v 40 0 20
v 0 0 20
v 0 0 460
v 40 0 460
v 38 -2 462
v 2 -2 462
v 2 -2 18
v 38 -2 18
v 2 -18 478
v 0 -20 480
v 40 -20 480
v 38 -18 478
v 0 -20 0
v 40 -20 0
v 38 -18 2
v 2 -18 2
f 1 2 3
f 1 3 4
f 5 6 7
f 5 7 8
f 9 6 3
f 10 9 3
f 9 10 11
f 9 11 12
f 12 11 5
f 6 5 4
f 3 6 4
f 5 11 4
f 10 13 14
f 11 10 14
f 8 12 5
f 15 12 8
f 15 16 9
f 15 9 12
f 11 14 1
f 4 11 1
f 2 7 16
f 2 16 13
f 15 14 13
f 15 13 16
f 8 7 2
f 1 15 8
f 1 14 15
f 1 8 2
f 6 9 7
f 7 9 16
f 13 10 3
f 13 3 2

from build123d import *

# Parameters (mm, degrees)
SKETCH1_W           = 40
SKETCH1_H           = 20
SKETCH1_W_2         = 36
SKETCH1_H_2         = 16
BOSS_EXTRUDE1_DEPTH = 480
CUT_EXTRUDE1_DEPTH  = 483.078831728


with BuildPart() as part:
    # Sketch1 → Boss-Extrude1 (new body)
    with BuildSketch(Plane.XY):
        with Locations((20, -10)):
            Rectangle(SKETCH1_W, SKETCH1_H)
        with Locations((20, -10)):
            Rectangle(SKETCH1_W_2, SKETCH1_H_2, mode=Mode.SUBTRACT)
    extrude(amount=BOSS_EXTRUDE1_DEPTH)

    # Sketch2 → Cut-Extrude1 (cut, through all)
    with BuildSketch(Plane(origin=(40, 0, 0), x_dir=(0, 0, -1), z_dir=(1, 0, 0))):
        Polygon((-480, -20), (-460, 0), (-480, 0), align=None)
        Polygon((-20, 0), (0, 0), (0, -20), align=None)
    extrude(amount=-CUT_EXTRUDE1_DEPTH, mode=Mode.SUBTRACT)


solid = part.part
